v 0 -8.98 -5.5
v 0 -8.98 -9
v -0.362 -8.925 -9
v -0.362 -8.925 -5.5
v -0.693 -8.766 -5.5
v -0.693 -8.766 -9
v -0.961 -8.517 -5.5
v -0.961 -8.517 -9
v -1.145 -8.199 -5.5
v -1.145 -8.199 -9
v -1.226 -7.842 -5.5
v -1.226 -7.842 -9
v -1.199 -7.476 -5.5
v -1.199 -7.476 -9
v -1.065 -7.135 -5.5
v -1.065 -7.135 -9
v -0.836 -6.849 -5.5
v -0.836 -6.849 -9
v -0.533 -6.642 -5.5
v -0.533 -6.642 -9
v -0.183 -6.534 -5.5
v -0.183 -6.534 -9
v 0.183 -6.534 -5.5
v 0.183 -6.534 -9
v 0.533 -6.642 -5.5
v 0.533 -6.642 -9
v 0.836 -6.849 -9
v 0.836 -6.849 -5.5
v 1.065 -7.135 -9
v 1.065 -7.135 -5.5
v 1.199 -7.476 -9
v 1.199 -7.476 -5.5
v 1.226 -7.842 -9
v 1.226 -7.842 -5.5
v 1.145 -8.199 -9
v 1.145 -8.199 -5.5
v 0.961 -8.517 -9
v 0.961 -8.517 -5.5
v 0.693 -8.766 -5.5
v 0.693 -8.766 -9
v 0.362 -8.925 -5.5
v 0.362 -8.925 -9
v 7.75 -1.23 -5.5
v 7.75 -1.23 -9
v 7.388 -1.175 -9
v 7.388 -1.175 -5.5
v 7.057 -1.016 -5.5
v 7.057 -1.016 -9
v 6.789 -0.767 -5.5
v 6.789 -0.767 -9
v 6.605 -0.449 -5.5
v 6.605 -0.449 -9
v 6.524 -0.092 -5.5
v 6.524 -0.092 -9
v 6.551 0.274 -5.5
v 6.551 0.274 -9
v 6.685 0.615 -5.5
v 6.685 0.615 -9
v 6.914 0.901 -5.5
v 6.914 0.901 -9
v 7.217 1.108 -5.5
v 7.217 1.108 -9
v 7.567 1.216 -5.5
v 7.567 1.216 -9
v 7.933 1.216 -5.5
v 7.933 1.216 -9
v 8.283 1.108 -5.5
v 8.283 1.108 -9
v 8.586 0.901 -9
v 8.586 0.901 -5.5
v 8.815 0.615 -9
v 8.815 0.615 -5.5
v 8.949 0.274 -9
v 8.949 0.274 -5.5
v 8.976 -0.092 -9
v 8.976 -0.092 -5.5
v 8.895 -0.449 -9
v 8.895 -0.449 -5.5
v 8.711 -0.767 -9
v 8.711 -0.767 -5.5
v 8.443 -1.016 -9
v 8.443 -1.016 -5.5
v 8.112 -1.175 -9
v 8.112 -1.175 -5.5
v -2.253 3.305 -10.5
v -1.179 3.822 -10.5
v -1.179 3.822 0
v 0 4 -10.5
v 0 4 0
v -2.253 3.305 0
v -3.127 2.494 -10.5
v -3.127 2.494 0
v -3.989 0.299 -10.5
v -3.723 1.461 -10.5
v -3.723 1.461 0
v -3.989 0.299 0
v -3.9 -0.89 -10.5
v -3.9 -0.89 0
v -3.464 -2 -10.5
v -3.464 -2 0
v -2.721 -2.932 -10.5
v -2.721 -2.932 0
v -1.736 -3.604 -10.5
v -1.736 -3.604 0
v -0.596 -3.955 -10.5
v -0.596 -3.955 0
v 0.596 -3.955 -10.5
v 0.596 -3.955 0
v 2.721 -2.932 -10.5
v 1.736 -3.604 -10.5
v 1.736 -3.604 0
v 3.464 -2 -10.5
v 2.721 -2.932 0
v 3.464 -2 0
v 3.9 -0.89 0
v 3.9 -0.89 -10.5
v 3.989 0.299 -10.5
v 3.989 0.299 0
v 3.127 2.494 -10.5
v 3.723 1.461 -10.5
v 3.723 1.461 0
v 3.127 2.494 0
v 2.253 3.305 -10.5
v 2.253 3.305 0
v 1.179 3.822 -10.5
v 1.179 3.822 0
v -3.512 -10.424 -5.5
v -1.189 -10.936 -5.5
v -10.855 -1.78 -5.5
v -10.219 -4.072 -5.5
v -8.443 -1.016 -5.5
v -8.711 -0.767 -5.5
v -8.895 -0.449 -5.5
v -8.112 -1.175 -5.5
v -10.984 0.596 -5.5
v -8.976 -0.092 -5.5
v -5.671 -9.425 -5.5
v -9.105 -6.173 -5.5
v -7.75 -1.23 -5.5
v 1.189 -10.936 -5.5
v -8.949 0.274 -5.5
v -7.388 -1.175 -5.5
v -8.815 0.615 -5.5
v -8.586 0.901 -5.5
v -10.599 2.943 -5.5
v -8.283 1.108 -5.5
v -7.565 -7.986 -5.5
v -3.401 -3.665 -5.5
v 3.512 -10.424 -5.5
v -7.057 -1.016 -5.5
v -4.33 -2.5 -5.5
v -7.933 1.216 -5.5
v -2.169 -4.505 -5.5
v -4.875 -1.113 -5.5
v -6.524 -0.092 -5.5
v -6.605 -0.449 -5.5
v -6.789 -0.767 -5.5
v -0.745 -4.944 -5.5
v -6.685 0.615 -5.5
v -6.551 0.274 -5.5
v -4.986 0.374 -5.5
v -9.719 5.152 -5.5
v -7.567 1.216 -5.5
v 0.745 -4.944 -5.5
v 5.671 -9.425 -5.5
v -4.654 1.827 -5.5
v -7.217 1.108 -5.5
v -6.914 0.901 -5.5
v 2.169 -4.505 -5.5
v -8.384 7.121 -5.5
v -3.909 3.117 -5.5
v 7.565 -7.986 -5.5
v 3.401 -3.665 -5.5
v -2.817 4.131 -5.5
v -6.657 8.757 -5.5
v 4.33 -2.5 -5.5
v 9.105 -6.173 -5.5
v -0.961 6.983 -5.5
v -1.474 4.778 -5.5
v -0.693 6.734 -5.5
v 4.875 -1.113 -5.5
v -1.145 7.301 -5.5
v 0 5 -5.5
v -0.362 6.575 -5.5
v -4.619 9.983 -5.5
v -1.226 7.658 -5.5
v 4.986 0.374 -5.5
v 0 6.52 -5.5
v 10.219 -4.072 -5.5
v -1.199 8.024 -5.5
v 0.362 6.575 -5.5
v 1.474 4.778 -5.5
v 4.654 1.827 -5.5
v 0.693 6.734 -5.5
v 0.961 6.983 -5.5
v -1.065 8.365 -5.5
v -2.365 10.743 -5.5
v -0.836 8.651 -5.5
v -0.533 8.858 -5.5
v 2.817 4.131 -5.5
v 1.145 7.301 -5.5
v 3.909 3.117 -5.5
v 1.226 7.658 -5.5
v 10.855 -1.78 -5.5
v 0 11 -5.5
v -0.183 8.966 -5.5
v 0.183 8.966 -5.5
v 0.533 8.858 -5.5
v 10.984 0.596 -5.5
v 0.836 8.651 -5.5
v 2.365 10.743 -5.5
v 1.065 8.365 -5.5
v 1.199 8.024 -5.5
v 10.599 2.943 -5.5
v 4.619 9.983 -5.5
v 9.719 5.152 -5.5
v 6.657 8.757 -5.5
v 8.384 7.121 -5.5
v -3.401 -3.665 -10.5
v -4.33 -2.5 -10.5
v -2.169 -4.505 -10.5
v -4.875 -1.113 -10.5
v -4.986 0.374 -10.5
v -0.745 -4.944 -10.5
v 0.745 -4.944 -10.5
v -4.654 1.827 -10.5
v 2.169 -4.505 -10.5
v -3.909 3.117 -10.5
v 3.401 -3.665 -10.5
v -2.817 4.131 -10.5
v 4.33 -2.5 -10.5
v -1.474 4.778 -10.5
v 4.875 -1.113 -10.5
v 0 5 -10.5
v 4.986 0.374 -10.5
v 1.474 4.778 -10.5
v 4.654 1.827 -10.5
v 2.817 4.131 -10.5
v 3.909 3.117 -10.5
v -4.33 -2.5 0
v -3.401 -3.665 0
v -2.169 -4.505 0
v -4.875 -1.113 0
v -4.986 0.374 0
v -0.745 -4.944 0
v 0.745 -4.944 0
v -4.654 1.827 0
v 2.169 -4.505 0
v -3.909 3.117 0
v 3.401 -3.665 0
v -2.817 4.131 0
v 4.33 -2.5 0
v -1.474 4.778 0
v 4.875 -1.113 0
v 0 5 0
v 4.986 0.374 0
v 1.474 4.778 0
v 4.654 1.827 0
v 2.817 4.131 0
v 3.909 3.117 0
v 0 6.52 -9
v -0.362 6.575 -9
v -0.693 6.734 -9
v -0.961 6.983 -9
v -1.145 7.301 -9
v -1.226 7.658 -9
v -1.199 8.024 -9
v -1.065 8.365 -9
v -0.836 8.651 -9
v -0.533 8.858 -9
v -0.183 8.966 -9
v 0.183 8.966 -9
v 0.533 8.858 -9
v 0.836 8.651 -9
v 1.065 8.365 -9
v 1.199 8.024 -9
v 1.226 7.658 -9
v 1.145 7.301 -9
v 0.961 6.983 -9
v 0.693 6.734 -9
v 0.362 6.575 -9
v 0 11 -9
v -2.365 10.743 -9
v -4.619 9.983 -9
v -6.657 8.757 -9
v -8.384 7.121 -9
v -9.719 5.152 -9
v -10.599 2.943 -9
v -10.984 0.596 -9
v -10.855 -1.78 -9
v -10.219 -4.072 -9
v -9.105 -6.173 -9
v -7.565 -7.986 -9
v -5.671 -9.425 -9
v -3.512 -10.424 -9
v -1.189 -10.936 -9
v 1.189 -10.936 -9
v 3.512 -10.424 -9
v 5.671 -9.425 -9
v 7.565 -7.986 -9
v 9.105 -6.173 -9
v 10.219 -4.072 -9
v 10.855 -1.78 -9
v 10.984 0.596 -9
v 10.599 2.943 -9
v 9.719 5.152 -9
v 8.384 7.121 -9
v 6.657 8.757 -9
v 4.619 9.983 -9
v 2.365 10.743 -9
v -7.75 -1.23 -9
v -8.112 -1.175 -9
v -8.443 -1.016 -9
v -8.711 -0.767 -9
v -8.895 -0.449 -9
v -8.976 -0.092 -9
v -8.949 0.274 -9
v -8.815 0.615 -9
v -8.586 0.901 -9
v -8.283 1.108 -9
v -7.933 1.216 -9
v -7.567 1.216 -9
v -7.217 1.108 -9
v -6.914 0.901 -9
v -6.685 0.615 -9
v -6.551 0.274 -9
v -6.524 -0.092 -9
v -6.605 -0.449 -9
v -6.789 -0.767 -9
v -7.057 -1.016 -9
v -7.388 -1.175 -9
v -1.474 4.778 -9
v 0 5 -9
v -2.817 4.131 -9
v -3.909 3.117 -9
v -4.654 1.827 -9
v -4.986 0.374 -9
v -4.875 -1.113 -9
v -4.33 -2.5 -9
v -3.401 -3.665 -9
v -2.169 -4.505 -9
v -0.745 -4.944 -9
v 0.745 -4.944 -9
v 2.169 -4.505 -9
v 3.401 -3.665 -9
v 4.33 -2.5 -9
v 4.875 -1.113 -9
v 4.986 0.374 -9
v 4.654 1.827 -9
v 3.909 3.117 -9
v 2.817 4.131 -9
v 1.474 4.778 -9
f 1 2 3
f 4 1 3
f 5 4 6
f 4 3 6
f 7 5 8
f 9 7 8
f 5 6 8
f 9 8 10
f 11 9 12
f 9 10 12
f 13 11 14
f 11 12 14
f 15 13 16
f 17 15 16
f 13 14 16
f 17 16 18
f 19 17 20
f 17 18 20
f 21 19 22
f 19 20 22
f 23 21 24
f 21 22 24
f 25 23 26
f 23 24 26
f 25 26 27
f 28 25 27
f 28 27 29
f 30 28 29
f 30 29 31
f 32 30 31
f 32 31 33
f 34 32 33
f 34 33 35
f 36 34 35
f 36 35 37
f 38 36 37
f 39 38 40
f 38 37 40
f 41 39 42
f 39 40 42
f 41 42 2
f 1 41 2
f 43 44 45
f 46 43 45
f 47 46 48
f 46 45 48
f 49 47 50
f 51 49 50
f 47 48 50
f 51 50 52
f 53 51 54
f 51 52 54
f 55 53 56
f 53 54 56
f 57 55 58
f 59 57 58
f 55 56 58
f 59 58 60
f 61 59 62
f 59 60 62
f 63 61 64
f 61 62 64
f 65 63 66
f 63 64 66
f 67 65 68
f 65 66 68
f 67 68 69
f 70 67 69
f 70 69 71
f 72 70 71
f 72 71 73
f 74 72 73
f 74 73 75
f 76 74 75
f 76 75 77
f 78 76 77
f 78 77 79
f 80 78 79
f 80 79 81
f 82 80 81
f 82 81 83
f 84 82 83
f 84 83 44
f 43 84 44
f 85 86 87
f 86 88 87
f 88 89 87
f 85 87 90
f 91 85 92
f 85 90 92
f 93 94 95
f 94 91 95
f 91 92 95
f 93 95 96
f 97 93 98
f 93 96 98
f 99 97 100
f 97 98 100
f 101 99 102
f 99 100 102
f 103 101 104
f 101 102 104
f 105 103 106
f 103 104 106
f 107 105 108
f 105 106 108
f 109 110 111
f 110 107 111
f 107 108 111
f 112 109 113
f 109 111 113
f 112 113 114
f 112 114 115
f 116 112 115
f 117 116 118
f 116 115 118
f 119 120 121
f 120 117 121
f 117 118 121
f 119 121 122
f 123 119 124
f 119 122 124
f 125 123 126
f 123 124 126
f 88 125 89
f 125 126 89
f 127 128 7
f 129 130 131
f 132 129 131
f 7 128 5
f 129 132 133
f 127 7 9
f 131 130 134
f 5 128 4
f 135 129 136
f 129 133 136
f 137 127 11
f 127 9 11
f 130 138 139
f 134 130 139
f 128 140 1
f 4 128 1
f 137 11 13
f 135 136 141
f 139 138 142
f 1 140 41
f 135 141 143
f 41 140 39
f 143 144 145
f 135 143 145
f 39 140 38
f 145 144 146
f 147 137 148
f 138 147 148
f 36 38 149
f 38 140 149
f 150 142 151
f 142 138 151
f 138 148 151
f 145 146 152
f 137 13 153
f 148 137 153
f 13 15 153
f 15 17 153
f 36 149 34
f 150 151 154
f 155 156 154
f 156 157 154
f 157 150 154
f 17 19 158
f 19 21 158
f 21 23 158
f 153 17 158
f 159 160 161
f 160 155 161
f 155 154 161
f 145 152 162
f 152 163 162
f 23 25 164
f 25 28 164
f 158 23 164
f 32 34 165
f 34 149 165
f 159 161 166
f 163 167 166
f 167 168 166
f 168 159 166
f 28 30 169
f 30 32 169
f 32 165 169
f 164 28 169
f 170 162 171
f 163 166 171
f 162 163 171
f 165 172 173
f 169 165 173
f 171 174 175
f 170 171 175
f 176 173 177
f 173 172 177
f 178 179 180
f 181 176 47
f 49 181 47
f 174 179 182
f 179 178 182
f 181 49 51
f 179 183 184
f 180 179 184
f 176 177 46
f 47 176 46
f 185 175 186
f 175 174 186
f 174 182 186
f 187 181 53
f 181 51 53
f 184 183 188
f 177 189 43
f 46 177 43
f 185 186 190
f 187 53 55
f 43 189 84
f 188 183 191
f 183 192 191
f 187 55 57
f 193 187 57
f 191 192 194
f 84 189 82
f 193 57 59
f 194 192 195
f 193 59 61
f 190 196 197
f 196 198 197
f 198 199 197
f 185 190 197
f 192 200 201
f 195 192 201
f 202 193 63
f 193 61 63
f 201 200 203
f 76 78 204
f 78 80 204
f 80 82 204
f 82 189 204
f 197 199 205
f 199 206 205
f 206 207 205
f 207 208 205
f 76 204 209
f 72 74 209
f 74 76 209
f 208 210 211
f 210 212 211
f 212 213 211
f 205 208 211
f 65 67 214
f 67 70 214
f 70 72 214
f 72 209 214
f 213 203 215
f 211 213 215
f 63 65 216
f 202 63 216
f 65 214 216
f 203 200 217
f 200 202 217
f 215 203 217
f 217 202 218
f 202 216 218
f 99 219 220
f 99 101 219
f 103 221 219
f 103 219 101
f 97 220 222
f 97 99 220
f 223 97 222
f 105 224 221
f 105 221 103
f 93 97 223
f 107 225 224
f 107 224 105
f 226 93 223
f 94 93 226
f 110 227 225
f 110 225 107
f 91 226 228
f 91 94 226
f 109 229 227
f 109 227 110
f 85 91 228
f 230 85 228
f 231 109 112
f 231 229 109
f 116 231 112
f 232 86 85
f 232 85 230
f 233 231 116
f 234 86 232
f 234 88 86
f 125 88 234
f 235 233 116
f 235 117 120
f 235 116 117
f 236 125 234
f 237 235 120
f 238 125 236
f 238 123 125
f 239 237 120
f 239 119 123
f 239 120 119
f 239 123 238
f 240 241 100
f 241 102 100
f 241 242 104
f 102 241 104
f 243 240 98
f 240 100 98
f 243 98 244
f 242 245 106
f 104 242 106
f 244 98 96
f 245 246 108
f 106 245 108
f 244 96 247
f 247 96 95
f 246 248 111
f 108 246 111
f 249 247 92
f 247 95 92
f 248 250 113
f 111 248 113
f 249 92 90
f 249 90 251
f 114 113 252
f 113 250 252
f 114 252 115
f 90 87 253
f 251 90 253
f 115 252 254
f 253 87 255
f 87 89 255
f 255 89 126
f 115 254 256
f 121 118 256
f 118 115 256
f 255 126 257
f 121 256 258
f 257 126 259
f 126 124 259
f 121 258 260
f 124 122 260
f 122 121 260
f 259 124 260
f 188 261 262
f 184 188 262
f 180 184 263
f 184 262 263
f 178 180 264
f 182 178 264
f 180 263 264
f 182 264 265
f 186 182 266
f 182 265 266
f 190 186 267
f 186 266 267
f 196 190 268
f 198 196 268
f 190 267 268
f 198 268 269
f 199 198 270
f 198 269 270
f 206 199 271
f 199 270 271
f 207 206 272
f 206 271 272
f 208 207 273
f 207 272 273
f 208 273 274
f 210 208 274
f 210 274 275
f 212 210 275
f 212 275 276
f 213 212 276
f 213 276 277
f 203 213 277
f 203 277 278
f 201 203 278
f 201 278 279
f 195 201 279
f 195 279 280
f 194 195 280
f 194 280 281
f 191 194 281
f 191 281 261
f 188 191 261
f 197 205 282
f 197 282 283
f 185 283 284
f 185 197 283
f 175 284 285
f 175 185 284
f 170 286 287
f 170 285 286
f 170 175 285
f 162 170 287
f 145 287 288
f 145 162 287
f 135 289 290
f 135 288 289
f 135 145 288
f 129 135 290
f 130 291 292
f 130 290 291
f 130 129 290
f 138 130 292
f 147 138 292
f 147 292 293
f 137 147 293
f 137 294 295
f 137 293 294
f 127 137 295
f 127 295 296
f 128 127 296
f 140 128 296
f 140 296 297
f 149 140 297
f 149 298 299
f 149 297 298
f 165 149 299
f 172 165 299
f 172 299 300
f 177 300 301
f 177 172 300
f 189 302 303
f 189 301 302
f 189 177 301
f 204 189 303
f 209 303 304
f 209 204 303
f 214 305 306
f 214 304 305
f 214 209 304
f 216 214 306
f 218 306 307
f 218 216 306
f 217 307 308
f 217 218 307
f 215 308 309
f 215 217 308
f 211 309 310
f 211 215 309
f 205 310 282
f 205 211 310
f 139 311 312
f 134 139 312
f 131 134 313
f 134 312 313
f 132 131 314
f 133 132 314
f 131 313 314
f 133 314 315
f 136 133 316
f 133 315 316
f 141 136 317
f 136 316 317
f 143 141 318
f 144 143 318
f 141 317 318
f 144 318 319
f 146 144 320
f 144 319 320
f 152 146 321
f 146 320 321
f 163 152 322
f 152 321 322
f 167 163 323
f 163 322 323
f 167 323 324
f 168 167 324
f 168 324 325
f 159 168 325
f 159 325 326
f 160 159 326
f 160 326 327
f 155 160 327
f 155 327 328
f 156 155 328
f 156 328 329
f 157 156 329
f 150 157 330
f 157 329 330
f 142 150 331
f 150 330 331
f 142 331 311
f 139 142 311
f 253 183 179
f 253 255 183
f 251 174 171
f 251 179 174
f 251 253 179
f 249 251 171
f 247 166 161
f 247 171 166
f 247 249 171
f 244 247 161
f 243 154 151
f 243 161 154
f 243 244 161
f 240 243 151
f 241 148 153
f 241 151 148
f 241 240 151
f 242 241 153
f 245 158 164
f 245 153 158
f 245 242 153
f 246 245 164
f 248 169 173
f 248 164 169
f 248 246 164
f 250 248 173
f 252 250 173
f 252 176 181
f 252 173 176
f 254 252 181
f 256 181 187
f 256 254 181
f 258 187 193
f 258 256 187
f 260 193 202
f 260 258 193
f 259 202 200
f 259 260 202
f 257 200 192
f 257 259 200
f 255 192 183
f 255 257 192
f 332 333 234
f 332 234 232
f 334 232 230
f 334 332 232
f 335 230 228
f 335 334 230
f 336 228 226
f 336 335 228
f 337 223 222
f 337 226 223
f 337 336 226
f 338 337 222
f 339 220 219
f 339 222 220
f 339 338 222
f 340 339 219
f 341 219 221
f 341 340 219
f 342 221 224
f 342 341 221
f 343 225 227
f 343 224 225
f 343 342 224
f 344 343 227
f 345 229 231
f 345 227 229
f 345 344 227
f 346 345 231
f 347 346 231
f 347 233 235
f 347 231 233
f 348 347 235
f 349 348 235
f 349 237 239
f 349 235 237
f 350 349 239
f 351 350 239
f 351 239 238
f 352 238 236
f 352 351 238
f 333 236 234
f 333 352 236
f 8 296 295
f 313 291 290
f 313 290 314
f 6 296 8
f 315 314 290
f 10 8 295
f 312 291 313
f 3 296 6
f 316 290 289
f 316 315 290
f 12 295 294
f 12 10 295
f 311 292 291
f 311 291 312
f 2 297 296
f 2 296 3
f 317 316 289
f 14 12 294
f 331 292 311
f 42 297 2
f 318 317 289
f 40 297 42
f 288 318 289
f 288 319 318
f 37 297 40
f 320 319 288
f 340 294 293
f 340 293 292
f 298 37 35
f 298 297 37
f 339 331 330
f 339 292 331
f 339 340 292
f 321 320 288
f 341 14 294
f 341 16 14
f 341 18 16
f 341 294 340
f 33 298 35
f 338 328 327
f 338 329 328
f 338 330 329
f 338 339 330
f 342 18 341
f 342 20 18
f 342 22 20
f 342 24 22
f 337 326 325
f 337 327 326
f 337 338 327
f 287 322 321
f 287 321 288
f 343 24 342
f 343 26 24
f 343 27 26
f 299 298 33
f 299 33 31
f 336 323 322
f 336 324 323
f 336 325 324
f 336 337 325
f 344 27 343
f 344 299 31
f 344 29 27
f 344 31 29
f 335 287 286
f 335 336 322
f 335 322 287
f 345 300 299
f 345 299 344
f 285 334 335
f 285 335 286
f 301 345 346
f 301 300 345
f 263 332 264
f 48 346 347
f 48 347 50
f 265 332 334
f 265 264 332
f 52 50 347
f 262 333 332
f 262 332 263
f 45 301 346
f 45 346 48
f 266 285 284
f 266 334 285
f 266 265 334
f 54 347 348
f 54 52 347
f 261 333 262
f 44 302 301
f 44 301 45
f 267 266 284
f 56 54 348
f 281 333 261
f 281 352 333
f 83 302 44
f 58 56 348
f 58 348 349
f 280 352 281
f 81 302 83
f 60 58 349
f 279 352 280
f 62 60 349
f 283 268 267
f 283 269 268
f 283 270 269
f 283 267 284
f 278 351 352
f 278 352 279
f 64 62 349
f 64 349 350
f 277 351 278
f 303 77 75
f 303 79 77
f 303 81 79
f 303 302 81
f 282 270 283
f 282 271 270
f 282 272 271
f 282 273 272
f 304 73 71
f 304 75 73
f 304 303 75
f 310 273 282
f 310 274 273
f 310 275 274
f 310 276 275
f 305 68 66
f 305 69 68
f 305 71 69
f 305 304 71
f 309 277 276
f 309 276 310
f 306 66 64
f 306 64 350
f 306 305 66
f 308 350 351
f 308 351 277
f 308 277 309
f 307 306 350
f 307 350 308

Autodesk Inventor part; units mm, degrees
ref_plane "YZ Plane" through (0, 0, 0) normal (1, 0, 0) x (0, 1, 0)
ref_plane "XZ Plane" through (0, 0, 0) normal (0, 1, 0) x (-1, 0, 0)
ref_plane "XY Plane" through (0, 0, 0) normal (0, 0, 1) x (1, 0, 0)
sketch "Sketch1" plane through (0, 0, 0) normal (1, 0, 0) x (0, 1, 0)
  line L0 (4, -10.5) -> (4, 0)
  line L1 (0, 0) -> (0, -10.5)
  line L2 (4, -10.5) -> (5, -10.5)
  line L3 (5, -10.5) -> (5, -9)
  line L4 (5, -9) -> (11, -9)
  line L5 (11, -9) -> (11, -5.5)
  line L6 (11, -5.5) -> (5, -5.5)
  line L7 (5, -5.5) -> (5, 0)
  line L8 (5, 0) -> (4, 0)
  dimension "d0" = 10.5
  dimension "d1" = 4
  dimension "d2" = 5
  dimension "d3" = 5
  dimension "d4" = 3.5
  dimension "d10" = 11
revolve "Revolution1" add sketch "Sketch1" angle 360 about axis through (0, 0, 0) along (0, 0, -1)
sketch "Sketch2" plane through (0, 0, -5.5) normal (0, 0, 1) x (1, 0, 0)
  point P0 (0, 0)
  point P1 (0, 7.75)
  point P2 (-7.75, 0)
  point P3 (0, -7.75)
  point P4 (7.75, 0)
  dimension "d6" = 15.5
  dimension "d7" = 7.75
  dimension "d8" = 15.5
  dimension "d9" = 7.75
hole "Hole1" at (0, 7.75, -5.5) at (-7.75, 0, -5.5) at (0, -7.75, -5.5) at (7.75, 0, -5.5) direction (0, 0, -1) diameter 2.459 end through all thread size "M3x0.5" class "6H" standard "ISO Metric profile"
equation "\"d7\" = 0.5 * d6"
equation "\"d9\" = 0.5 * d8"
properties part number "Z Axis Nut" material "Brass, Soft Yellow"
